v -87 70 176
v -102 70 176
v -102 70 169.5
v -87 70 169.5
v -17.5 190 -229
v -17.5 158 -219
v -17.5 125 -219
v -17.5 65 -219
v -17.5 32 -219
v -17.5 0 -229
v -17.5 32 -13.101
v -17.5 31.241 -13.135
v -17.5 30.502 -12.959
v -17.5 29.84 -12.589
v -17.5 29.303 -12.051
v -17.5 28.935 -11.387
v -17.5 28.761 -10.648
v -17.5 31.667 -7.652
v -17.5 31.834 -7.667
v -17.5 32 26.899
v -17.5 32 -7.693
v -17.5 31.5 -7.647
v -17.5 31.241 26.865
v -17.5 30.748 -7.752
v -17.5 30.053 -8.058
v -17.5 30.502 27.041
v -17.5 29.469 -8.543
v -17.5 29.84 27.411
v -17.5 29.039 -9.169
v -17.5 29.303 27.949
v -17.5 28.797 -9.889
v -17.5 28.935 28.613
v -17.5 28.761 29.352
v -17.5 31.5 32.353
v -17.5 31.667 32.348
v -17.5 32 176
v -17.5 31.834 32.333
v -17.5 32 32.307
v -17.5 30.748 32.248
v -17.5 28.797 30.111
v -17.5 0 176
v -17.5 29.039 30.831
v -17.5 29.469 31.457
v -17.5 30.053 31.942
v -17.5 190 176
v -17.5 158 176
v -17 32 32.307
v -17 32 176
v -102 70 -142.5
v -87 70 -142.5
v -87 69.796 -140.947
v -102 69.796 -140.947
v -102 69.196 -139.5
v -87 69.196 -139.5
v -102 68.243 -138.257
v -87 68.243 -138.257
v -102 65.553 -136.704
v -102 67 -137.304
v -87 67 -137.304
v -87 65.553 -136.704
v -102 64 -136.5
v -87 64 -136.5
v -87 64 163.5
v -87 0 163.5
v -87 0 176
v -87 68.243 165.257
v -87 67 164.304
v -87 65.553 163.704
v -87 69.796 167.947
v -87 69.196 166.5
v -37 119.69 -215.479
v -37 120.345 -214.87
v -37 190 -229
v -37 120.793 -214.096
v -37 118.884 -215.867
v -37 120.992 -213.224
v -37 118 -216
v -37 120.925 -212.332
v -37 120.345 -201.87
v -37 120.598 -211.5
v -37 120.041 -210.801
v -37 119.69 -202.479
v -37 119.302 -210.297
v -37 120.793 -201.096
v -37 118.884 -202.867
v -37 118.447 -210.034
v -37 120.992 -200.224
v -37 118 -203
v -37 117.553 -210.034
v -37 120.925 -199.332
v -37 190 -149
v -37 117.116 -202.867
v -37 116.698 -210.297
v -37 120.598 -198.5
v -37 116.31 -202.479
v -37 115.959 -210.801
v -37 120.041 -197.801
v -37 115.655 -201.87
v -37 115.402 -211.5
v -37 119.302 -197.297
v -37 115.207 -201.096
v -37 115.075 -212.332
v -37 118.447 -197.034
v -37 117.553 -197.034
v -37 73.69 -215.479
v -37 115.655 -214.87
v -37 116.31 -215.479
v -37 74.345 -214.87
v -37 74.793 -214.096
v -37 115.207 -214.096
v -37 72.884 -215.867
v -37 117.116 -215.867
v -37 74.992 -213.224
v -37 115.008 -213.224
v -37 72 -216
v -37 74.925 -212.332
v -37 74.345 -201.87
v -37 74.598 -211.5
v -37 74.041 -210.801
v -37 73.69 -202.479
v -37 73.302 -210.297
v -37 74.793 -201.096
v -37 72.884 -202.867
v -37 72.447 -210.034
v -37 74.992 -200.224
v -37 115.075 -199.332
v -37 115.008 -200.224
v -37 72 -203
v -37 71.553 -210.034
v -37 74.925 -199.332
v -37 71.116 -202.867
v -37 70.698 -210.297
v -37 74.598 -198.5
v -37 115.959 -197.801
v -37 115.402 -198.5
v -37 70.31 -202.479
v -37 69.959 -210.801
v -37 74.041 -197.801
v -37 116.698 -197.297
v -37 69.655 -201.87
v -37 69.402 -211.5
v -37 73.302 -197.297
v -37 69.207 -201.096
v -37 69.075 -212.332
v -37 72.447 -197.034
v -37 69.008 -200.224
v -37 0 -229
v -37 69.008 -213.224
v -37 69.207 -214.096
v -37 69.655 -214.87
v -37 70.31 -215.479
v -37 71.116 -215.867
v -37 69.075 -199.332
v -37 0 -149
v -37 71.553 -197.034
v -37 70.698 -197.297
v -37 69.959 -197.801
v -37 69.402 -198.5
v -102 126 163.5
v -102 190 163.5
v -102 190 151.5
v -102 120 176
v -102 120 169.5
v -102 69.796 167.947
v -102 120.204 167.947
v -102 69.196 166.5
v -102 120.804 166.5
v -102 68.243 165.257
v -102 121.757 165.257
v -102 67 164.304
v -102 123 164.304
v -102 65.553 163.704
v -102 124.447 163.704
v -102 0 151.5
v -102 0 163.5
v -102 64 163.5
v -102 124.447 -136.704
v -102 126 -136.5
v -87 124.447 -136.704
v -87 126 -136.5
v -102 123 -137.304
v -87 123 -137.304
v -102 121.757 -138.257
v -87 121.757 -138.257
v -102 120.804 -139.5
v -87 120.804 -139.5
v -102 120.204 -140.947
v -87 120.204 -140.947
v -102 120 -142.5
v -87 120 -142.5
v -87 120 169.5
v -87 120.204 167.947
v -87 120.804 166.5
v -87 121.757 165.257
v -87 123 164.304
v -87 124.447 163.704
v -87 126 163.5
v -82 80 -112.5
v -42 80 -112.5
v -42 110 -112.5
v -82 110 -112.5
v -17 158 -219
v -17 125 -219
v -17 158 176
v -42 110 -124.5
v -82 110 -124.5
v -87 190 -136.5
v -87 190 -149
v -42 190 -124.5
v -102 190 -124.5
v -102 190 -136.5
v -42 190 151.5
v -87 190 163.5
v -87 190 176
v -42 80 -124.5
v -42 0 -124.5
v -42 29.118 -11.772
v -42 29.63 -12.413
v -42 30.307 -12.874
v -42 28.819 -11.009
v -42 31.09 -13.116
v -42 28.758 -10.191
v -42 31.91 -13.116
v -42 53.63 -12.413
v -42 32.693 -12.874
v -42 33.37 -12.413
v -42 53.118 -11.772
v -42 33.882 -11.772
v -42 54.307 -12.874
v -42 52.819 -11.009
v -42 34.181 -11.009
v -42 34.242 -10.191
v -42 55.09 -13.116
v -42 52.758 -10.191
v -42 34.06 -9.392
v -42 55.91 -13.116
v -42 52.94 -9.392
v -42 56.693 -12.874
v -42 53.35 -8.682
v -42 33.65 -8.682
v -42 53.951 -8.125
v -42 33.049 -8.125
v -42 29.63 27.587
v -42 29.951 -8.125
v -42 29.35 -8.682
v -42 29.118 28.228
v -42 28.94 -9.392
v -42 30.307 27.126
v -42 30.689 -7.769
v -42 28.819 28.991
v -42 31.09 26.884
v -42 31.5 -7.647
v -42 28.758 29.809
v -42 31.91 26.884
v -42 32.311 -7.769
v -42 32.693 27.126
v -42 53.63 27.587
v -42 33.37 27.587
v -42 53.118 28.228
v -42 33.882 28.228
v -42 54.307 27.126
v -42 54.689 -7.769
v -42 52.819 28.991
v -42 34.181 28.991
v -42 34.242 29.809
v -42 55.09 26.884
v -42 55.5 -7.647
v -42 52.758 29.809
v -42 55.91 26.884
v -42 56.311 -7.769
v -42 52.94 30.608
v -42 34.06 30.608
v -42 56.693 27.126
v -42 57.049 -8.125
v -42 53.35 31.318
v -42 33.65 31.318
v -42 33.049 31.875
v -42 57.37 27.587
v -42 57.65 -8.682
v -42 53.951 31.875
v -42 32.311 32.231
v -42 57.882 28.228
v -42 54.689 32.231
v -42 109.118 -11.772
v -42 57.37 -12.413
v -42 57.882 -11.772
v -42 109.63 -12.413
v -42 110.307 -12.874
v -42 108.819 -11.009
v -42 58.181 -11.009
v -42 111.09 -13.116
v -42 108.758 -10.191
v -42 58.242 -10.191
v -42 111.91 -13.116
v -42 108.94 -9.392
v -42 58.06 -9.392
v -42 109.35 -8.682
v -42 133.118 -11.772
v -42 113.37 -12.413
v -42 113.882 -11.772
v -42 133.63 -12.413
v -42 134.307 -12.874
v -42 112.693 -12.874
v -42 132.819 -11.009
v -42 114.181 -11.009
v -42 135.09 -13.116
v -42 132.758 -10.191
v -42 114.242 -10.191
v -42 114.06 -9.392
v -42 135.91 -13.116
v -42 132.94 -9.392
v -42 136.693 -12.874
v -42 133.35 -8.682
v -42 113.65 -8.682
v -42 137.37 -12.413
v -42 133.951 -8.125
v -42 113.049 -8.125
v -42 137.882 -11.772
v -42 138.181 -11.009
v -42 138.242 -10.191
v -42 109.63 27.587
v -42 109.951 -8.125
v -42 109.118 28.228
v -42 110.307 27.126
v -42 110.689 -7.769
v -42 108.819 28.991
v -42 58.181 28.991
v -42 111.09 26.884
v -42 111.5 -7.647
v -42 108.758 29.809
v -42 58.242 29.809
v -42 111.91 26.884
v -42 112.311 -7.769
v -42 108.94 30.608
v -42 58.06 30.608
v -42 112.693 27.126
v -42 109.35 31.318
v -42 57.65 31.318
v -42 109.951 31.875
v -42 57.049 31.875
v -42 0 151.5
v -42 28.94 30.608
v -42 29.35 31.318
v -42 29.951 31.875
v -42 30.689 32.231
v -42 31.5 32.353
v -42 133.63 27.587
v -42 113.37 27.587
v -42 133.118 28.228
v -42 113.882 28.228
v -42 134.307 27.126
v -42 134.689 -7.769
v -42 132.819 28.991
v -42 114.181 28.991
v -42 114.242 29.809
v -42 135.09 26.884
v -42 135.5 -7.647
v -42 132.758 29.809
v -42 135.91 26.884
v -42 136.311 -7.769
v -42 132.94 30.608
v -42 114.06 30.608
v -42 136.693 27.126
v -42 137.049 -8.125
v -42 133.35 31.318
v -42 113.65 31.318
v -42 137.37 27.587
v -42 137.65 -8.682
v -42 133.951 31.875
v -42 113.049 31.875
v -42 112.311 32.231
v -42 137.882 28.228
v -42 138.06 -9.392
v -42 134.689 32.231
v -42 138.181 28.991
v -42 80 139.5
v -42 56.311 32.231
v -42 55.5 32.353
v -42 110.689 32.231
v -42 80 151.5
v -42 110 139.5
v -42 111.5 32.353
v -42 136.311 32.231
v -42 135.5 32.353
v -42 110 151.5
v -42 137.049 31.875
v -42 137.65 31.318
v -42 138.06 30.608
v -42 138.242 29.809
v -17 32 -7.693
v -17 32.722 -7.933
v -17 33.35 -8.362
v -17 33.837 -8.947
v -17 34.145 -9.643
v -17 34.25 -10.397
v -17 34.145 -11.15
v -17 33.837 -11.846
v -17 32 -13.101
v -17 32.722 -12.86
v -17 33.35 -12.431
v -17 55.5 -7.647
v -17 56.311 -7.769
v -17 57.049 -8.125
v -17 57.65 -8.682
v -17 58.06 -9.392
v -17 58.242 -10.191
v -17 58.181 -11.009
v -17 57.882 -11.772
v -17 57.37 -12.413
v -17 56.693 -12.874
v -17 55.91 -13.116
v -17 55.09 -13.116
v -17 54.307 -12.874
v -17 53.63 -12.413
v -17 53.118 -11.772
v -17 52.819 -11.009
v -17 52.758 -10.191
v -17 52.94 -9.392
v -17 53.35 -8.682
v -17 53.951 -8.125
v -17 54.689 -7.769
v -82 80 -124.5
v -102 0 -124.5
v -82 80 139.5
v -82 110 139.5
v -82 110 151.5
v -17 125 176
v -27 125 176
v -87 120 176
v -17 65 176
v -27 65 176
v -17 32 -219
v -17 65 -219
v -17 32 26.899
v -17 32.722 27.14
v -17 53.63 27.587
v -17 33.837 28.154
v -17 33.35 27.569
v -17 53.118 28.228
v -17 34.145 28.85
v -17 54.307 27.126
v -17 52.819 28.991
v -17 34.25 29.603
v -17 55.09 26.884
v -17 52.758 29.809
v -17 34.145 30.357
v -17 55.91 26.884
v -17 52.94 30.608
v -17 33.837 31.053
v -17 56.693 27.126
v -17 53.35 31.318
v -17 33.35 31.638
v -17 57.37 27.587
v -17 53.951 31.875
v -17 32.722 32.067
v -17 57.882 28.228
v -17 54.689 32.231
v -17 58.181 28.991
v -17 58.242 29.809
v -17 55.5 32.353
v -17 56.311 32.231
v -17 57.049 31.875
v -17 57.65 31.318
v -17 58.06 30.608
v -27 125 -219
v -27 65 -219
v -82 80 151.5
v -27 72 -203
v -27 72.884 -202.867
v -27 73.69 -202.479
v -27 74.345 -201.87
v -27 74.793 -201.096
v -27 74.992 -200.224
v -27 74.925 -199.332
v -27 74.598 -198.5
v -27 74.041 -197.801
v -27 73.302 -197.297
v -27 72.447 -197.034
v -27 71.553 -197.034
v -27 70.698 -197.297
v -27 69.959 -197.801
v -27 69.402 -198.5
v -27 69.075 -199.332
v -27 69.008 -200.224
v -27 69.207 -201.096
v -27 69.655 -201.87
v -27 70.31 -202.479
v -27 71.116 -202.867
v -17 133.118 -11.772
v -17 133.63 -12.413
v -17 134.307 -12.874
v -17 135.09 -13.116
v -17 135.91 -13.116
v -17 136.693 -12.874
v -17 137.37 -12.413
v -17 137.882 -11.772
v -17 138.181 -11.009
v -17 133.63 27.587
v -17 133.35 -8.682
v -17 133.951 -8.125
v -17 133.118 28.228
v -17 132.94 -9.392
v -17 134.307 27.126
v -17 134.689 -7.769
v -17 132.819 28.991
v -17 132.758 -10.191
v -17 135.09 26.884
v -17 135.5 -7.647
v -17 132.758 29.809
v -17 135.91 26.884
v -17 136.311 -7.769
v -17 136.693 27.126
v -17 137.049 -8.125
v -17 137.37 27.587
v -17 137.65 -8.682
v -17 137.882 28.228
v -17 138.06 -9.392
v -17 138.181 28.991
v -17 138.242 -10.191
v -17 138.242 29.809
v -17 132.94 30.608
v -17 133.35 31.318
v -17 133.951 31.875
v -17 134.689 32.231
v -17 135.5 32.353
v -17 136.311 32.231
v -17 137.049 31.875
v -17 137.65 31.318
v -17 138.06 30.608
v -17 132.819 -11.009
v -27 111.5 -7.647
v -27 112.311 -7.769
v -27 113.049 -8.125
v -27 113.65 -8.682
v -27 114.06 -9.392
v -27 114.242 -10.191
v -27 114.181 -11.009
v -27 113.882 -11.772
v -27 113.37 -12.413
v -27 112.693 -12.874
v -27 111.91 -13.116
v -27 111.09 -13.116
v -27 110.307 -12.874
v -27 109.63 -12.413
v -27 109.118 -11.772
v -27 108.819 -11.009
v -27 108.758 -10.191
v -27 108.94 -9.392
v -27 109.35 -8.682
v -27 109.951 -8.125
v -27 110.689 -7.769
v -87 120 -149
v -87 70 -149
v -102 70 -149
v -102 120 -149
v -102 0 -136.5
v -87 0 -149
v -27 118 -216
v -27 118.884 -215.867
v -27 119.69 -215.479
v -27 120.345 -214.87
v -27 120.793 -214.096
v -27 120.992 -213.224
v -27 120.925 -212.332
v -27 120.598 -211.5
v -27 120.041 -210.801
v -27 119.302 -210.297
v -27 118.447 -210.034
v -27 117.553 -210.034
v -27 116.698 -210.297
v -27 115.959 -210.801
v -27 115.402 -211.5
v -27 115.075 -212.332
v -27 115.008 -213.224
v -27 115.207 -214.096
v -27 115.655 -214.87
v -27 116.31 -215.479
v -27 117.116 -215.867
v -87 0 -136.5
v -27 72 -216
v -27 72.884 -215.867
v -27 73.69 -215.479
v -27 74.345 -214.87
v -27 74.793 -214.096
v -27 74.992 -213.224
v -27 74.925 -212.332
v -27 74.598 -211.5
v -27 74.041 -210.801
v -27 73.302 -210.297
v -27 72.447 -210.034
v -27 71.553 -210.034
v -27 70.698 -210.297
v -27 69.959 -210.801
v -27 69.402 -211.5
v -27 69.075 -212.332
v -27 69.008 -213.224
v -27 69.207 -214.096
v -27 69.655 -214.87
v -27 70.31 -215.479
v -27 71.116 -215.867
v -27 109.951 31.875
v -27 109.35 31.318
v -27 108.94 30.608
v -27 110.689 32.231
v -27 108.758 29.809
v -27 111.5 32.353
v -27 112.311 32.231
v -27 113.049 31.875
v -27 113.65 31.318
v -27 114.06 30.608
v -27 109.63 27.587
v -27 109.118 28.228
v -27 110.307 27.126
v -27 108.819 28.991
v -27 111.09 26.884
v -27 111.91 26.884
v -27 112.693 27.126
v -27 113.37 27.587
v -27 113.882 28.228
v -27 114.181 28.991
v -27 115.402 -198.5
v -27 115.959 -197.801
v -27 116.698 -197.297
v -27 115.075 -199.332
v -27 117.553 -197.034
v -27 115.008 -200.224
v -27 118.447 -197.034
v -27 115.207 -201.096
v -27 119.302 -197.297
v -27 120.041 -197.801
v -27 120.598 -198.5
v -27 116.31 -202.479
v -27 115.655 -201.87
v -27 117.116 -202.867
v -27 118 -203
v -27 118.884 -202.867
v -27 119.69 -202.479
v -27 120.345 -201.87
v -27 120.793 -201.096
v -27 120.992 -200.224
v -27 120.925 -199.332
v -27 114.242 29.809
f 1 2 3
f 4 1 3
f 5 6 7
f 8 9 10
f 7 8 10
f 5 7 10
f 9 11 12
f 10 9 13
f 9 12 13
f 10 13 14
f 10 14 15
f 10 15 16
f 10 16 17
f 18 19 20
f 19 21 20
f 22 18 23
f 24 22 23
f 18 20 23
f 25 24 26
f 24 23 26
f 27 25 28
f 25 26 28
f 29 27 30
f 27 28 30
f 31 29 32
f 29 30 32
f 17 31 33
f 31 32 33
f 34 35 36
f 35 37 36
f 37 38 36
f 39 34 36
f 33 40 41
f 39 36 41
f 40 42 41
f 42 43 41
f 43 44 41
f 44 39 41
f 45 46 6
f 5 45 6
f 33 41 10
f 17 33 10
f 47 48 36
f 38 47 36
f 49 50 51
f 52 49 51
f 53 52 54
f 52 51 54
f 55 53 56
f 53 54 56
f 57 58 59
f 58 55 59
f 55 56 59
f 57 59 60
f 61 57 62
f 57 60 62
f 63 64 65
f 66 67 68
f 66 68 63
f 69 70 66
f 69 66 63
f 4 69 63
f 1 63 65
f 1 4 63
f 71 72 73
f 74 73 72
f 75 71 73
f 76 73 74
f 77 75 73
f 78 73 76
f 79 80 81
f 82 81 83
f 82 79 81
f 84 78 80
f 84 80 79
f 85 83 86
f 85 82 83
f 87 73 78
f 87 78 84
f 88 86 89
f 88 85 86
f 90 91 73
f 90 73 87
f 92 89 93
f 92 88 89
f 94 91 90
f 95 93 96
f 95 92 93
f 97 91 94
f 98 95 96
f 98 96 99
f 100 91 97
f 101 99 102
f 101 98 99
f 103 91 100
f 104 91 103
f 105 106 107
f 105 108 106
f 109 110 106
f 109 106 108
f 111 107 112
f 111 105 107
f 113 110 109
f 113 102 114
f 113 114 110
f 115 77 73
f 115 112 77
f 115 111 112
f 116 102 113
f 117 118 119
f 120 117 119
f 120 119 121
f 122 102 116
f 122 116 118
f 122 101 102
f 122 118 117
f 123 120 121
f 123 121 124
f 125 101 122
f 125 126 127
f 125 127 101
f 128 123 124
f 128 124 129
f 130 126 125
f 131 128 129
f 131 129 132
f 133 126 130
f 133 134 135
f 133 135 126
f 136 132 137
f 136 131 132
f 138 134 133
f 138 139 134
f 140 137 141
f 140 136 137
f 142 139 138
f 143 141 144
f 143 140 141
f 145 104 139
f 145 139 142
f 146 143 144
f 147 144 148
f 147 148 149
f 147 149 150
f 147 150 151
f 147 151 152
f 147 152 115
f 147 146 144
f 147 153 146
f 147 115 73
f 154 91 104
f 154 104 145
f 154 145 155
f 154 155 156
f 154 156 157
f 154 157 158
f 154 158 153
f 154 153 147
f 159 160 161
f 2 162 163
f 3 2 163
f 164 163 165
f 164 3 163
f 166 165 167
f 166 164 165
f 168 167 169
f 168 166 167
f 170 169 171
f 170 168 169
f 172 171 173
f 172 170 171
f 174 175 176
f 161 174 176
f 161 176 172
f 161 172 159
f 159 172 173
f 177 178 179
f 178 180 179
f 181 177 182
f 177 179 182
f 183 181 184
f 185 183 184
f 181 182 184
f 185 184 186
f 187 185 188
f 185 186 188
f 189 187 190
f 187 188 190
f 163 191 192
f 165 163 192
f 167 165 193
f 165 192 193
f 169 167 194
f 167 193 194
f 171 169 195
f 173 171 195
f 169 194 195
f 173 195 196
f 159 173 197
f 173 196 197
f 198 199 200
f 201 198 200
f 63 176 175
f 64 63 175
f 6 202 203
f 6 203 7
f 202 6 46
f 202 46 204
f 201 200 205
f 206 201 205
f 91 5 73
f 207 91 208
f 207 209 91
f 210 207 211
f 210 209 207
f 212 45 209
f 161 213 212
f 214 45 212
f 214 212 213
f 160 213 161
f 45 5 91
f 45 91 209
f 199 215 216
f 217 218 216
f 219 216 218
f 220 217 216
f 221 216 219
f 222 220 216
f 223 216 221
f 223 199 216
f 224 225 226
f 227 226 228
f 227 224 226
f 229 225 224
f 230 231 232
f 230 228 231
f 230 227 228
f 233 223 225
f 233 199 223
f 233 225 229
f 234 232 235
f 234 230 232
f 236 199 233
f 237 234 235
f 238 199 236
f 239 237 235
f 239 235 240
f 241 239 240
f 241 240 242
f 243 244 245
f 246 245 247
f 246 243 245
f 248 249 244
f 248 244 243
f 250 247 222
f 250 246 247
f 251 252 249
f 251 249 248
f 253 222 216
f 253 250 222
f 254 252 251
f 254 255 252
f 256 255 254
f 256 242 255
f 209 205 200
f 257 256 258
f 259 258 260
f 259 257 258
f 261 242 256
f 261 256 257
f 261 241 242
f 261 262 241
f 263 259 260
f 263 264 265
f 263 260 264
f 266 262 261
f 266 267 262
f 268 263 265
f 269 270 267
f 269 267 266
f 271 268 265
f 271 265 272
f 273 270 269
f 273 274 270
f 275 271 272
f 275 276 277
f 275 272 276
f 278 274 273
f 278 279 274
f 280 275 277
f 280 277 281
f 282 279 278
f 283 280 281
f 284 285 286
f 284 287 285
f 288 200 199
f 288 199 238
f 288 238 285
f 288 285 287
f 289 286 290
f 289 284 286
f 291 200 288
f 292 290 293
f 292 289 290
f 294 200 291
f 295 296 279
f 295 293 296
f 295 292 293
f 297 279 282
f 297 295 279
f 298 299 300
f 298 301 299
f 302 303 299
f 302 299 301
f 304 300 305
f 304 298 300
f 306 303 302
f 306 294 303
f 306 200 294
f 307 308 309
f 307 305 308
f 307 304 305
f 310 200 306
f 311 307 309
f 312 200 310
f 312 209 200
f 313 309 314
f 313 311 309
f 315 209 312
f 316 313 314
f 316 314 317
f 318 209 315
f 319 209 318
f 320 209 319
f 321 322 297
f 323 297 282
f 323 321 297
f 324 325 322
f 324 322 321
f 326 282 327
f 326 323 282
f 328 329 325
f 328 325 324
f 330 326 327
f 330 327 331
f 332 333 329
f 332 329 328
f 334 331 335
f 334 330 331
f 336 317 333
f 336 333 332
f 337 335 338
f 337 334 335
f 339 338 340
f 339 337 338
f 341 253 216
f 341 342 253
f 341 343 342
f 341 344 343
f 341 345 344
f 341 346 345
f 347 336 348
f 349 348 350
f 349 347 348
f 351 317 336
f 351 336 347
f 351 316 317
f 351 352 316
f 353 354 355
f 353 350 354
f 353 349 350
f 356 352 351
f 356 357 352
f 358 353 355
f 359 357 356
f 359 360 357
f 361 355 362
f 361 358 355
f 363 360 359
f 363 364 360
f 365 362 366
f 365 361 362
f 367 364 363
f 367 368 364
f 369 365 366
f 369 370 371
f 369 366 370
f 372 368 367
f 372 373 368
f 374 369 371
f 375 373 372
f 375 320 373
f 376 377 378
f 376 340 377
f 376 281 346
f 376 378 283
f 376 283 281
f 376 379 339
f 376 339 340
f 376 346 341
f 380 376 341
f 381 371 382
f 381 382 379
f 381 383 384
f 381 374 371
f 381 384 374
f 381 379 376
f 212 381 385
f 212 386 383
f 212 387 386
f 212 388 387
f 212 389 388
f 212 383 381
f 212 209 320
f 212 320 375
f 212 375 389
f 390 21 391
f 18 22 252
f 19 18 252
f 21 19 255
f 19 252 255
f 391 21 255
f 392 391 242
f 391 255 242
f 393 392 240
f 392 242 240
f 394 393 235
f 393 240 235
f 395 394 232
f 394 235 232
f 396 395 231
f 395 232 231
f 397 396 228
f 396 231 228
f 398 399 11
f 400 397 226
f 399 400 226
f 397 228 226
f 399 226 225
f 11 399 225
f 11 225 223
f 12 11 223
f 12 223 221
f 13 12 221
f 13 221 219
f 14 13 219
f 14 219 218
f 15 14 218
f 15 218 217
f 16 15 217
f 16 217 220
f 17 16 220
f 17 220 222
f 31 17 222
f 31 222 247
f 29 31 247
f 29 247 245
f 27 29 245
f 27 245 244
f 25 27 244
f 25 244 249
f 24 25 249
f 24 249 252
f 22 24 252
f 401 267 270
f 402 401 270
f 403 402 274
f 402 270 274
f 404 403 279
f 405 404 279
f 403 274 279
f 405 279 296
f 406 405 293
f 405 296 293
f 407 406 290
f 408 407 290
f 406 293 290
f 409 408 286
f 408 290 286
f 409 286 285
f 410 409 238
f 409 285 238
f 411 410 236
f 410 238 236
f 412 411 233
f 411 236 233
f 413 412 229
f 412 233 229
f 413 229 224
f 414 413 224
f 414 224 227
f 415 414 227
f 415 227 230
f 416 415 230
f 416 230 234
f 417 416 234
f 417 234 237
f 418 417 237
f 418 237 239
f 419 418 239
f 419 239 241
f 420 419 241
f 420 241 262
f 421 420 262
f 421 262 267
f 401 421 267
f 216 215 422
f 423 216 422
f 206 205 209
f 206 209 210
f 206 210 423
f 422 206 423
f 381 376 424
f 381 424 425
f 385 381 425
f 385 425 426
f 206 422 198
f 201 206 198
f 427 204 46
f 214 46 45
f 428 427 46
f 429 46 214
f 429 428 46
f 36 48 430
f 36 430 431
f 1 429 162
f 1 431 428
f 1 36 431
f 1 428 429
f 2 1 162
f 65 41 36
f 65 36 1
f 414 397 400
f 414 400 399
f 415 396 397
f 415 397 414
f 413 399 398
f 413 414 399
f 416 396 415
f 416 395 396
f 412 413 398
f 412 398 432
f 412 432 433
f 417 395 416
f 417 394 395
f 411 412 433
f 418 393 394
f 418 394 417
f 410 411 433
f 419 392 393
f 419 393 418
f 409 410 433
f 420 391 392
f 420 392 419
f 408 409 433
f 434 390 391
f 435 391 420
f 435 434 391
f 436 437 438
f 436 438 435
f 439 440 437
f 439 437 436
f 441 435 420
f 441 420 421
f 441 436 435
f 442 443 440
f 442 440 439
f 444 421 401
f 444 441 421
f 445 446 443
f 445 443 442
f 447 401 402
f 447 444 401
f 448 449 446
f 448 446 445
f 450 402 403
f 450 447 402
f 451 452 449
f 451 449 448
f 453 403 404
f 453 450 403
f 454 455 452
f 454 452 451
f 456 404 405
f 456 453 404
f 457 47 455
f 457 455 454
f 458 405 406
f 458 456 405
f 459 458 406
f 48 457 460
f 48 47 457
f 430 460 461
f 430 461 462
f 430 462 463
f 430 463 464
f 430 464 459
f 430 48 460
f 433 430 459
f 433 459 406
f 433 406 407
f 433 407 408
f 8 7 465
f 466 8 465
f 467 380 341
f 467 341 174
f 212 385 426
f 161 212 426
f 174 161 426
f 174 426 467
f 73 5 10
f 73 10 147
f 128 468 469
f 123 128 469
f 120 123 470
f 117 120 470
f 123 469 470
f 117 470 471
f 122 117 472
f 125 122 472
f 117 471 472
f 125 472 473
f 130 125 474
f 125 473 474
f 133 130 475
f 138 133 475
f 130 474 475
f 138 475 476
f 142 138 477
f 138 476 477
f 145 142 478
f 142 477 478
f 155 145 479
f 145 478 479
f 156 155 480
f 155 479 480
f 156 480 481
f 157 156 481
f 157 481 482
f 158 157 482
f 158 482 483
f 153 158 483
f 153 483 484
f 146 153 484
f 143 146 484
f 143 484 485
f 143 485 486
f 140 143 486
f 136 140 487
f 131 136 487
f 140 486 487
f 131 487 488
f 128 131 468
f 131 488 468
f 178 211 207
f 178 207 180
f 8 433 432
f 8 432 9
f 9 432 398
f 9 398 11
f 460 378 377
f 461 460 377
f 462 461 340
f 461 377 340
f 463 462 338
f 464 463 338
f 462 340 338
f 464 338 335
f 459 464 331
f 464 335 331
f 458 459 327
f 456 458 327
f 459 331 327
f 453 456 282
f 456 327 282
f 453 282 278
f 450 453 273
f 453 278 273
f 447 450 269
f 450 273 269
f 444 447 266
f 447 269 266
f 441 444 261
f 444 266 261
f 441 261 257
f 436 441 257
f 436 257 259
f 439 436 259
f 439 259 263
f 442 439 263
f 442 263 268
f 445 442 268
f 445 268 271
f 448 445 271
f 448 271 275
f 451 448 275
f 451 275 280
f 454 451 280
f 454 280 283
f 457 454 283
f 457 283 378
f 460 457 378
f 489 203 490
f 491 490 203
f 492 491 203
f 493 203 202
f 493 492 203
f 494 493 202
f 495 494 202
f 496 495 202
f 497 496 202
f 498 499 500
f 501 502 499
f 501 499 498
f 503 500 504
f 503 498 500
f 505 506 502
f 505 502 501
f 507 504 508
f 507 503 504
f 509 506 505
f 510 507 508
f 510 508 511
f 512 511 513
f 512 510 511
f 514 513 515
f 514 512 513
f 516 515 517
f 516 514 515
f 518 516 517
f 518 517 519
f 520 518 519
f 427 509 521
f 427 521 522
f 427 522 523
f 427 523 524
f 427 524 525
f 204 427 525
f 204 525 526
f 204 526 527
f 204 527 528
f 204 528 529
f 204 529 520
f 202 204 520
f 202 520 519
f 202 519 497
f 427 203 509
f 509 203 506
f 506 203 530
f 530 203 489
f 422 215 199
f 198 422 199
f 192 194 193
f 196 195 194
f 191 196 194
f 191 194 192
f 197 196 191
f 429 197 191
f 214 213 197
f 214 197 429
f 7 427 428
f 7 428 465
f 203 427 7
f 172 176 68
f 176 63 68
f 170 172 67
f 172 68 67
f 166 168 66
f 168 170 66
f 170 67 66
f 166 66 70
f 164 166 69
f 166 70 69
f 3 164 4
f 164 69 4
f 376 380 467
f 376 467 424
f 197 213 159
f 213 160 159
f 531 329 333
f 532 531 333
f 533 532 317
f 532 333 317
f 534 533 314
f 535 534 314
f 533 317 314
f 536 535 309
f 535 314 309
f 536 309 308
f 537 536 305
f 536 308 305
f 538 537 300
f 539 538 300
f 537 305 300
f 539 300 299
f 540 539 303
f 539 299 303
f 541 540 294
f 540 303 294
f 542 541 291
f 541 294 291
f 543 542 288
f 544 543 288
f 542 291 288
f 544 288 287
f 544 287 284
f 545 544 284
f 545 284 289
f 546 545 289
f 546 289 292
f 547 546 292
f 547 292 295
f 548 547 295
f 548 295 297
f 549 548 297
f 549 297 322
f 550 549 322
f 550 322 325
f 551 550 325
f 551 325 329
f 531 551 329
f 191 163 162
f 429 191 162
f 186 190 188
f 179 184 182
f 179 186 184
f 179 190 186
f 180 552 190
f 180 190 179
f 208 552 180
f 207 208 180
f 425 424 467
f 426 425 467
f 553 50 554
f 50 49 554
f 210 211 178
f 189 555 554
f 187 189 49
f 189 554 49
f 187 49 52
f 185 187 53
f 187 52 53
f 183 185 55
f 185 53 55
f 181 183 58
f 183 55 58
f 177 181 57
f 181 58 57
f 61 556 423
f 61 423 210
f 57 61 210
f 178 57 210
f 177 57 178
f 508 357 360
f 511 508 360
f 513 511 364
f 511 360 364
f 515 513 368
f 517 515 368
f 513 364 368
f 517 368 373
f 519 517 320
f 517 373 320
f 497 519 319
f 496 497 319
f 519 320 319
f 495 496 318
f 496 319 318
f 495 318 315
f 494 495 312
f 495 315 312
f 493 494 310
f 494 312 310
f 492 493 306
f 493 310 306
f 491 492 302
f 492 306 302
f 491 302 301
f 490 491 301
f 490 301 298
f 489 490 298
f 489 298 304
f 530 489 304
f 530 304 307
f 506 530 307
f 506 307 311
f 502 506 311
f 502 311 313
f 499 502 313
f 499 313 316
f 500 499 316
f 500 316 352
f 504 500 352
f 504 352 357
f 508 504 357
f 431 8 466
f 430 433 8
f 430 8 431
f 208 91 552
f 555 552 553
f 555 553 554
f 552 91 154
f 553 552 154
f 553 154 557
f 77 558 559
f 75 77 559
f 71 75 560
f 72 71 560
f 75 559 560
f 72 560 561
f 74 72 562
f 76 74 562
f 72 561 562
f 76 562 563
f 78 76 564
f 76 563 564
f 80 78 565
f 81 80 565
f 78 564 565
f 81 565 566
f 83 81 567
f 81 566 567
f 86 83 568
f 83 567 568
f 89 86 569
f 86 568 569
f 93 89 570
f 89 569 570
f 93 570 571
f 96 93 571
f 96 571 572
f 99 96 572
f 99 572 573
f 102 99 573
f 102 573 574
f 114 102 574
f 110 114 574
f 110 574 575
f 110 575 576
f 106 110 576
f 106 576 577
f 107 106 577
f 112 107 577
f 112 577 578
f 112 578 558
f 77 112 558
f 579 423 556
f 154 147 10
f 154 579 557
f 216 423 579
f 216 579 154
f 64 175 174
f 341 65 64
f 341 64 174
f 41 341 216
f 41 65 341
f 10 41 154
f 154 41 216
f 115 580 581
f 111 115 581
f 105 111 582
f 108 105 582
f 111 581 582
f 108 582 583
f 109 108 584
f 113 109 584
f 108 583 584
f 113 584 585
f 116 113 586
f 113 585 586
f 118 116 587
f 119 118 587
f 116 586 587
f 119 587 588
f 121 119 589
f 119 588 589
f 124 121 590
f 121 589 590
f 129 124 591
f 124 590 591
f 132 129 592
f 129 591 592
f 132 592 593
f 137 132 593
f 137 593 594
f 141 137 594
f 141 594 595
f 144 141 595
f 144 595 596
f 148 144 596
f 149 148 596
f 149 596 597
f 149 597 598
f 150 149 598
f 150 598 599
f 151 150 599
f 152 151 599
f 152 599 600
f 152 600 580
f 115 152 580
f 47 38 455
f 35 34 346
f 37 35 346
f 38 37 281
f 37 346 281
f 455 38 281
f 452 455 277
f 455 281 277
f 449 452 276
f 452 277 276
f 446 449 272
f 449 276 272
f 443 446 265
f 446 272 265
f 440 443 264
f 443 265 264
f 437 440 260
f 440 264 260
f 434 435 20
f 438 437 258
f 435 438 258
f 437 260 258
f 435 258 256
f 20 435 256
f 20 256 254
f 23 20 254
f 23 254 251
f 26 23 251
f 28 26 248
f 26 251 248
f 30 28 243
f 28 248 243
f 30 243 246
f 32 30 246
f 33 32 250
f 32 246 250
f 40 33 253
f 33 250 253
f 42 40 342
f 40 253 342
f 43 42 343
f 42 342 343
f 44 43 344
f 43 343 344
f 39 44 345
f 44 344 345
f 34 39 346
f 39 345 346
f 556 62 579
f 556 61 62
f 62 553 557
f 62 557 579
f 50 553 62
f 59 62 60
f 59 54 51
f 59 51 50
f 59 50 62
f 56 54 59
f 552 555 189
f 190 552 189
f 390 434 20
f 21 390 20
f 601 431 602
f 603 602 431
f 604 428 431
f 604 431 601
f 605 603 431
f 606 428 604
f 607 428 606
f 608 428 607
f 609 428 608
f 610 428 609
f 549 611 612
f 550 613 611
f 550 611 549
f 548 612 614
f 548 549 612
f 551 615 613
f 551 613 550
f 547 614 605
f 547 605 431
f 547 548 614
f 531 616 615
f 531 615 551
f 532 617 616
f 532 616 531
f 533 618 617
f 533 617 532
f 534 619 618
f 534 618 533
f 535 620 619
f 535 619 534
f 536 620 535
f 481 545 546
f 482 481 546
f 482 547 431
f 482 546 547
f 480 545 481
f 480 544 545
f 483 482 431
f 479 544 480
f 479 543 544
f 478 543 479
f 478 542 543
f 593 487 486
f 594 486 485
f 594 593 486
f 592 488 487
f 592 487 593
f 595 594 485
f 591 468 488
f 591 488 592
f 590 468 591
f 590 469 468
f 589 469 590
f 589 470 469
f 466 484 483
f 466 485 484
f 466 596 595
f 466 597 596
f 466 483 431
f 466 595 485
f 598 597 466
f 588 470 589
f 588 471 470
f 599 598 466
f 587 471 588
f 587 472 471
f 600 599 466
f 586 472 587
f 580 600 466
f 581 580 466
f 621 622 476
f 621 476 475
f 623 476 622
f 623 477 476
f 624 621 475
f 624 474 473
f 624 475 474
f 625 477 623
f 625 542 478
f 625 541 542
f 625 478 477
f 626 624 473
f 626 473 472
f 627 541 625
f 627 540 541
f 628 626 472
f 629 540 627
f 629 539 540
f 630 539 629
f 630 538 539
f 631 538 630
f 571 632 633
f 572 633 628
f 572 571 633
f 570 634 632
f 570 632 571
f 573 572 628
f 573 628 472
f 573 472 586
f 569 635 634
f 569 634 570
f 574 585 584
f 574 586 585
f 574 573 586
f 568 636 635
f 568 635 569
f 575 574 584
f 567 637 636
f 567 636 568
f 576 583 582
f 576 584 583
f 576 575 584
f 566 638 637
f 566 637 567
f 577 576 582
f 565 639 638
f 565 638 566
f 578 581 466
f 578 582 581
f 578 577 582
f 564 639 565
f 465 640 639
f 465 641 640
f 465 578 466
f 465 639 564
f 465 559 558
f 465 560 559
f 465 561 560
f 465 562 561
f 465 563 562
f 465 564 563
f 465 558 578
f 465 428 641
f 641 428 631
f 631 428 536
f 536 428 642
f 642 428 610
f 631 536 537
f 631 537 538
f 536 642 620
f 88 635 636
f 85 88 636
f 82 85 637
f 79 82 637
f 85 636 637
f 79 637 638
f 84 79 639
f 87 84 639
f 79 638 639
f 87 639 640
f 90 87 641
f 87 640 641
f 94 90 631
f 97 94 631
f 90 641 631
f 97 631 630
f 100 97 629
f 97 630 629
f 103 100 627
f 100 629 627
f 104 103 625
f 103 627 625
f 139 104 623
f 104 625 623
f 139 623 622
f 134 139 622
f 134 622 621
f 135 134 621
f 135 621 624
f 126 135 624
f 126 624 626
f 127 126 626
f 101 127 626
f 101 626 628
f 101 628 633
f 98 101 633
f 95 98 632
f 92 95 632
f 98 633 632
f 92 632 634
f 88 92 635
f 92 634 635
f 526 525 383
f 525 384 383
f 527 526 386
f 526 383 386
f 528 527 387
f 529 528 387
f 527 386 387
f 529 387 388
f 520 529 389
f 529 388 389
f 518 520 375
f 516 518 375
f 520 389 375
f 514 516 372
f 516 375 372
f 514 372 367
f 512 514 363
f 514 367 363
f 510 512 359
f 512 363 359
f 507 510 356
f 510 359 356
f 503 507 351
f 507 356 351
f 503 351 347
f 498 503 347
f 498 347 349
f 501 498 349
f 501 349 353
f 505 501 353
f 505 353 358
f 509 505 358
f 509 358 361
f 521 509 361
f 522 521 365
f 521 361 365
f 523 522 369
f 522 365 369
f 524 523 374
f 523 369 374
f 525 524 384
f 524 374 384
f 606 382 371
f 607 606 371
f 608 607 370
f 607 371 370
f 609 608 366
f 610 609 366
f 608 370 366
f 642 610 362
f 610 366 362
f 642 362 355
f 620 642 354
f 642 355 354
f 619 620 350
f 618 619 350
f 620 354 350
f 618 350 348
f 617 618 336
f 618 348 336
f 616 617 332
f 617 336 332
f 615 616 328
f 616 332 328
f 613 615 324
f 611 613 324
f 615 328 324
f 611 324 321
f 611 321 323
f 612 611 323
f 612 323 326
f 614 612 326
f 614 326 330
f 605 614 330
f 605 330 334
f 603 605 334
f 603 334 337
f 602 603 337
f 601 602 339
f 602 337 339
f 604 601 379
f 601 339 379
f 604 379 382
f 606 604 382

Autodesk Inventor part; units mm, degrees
ref_plane "YZ Plane" through (0, 0, 0) normal (1, 0, 0) x (0, 1, 0)
ref_plane "XZ Plane" through (0, 0, 0) normal (0, 1, 0) x (-1, 0, 0)
ref_plane "XY Plane" through (0, 0, 0) normal (0, 0, 1) x (1, 0, 0)
sketch "Эскиз1" plane through (0, 0, 0) normal (0, 1, 0) x (-1, 0, 0)
  line L0 (102, 151) -> (42, 151)
  line L1 (42, -149) -> (102, -149)
  line L2 (102, -149) -> (102, 151)
  line L3 (102, 151) -> (42, 151)
  line L4 (42, 151) -> (42, 176)
  line L5 (42, 176) -> (102, 176)
  line L6 (102, 176) -> (102, 151)
  line L7 (102, -149) -> (42, -149)
  line L8 (42, -149) -> (42, -124)
  line L9 (42, -124) -> (102, -124)
  line L10 (102, -124) -> (102, -149)
  line L11 (42, 176) -> (42, -124)
  line L12 (42, 176) -> (17, 176)
  line L13 (17, 176) -> (17, -149)
  line L14 (17, -149) -> (42, -149)
  line L15 (42, -149) -> (42, 176)
  point P0 (0, 0)
  point P1 (42, 151)
  dimension "d0" = 300
  dimension "d1" = 60
  dimension "d2" = 25
  dimension "d3" = 25
  dimension "d5" = 25
  dimension "d33" = 25
extrude "Выдавливание1" add sketch "Эскиз1" along normal blind 190 contours L0 L4 L5 L6 | L11 L8 L14 L13 L12 L4 | L2 L1 L8 L9
sketch "Эскиз2" plane through (-17, 0, 176) normal (1, 0, 0) x (0, 0, -1)
  line L0 (0, 0) -> (325, 0) projected
  line L1 (325, 0) -> (325, 190) projected
  line L2 (0, 190) -> (325, 190) projected
  line L3 (0, 0) -> (0, 190) projected
  line L4 (-98, 158) -> (488, 158)
  line L5 (488, 158) -> (488, 32)
  line L6 (488, 32) -> (-98, 32)
  line L7 (-98, 32) -> (-98, 158)
  point P0 (176, 0)
  point P1 (325, 32)
  point P2 (0, 32)
  point P3 (0, 158)
  point P4 (325, 158)
  dimension "d8" = 32
  dimension "d9" = 32
extrude "Выдавливание2" cut sketch "Эскиз2" against normal blind 0.5 contours L3 L6 L1 L0 | L3 L2 L1 L4
sketch "Эскиз4" plane through (-102, 0, -149) normal (0, 0, -1) x (-1, 0, 0)
  line L0 (-85, 32) -> (-84.5, 32) projected
  line L1 (-84.5, 32) -> (-84.5, 0) projected
  line L2 (-84.5, 0) -> (0, 0) projected
  line L3 (0, 0) -> (0, 190) projected
  line L4 (-84.5, 190) -> (0, 190) projected
  line L5 (-84.5, 190) -> (-84.5, 158) projected
  line L6 (-84.5, 158) -> (-85, 158) projected
  line L7 (-85, 32) -> (-85, 158) projected
  line L8 (-92, 195) -> (-65, 195)
  line L9 (-65, 195) -> (-65, -10)
  line L10 (-65, -10) -> (-92, -10)
  line L11 (-92, -10) -> (-92, 195)
  point P0 (-102, 0)
  point P1 (-65, 0)
  point P2 (-65, 190)
  dimension "d12" = 20
extrude "Выдавливание3" add sketch "Эскиз4" along normal blind 70 contours L7 L6 L5 L4 L9 L2 L1 L0
sketch "Эскиз5" plane through (-17, 32, 176) normal (1, 0, 0) x (0, 0, -1)
  line L0 (0, 0) -> (395, 0) projected
  line L1 (395, 126) -> (395, 0) projected
  line L2 (0, 126) -> (395, 126) projected
  line L3 (0, 0) -> (0, 126) projected
  line L4 (-43, 93) -> (474, 93)
  line L5 (474, 93) -> (474, 33)
  line L6 (474, 33) -> (-43, 33)
  line L7 (-43, 33) -> (-43, 93)
  point P0 (176, -32)
  dimension "d15" = 33
  dimension "d16" = 33
extrude "Выдавливание4" cut sketch "Эскиз5" against normal blind 10 contours L6 L7 L4 L3 | L3 L4 L1 L6 | L1 L4 L5 L6
sketch "Эскиз6" plane through (-102, 0, -149) normal (-1, 0, 0) x (0, 0, 1)
  line L0 (0, 0) -> (25, 0) projected
  line L1 (25, 0) -> (25, 190) projected
  line L2 (0, 190) -> (25, 190) projected
  line L3 (0, 0) -> (0, 190) projected
  line L4 (300, 0) -> (325, 0) projected
  line L5 (325, 0) -> (325, 190) projected
  line L6 (300, 190) -> (325, 190) projected
  line L7 (300, 0) -> (300, 190) projected
  line L8 (325, 190) -> (-70, 190) projected
  line L9 (300, 0) -> (325, 0) projected
  line L10 (325, 190) -> (312.5, 190)
  line L11 (312.5, 190) -> (312.5, 0)
  line L12 (312.5, 0) -> (325, 0)
  line L13 (325, 0) -> (325, 190)
  line L14 (0, 190) -> (25, 190) projected
  line L15 (0, 0) -> (25, 0) projected
  line L16 (0, 190) -> (12.5, 190)
  line L17 (12.5, 190) -> (12.5, 0)
  line L18 (12.5, 0) -> (0, 0)
  line L19 (0, 0) -> (0, 190)
  line L20 (347, 70) -> (-28, 70)
  line L21 (-28, 70) -> (-28, 120)
  line L22 (-28, 120) -> (347, 120)
  line L23 (347, 120) -> (347, 70)
  point P0 (149, 0)
  point P1 (12.5, 0)
  point P2 (12.5, 190)
  point P3 (12.5, 70)
  point P4 (0, 70)
  point P5 (0, 120)
  point P6 (12.5, 120)
  point P7 (325, 70)
  point P8 (312.5, 70)
  point P9 (312.5, 120)
  point P10 (325, 120)
  dimension "d21" = 70
  dimension "d22" = 70
extrude "Выдавливание5" cut sketch "Эскиз6" against normal blind 15 contours L3 L20 L17 L0 | L3 L2 L17 L22 | L20 L5 L4 L11 | L11 L6 L5 L22
fillet "Сопряжение1" radius 6 4 edges at (-94.5, 70, -136.5) (-94.5, 120, -136.5) (-94.5, 120, 163.5) (-94.5, 70, 163.5)
sketch "Эскиз8" plane through (-17, 158, 176) normal (1, 0, 0) x (0, 0, -1)
  line L0 (376, -40) -> (389, -40)
  line L1 (389, -40) -> (389, -86)
  line L2 (389, -86) -> (376, -86)
  line L3 (376, -86) -> (376, -40)
  line L4 (395, -33) -> (395, -93) projected
  circle A0 centre (389, -40) radius 3
  circle A1 centre (389, -86) radius 3
  circle A2 centre (376, -40) radius 3
  circle A3 centre (376, -86) radius 3
  point P0 (176, -158)
  dimension "d24" = 6
  dimension "d25" = 46
  dimension "d26" = 13
extrude "Выдавливание6" cut sketch "Эскиз8" against normal blind 100 contours L3 A2 L0 | L0 A2 L3 | A0 L1 L0 | L0 L1 A0 | A3 L2 L3 | L3 L2 A3 | A1 L2 L1 | L1 L2 A1
sketch "Эскиз9" plane through (-102, 0, -219) normal (0, 0, -1) x (-1, 0, 0)
  line L0 (-84.5, 190) -> (-84.5, 158) projected
  line L1 (-65, 0) -> (-15, 0) projected
  line L2 (-84.5, 190) -> (-65, 190)
  line L3 (-65, 190) -> (-65, 0)
  line L4 (-65, 0) -> (-84.5, 0)
  line L5 (-84.5, 0) -> (-84.5, 190)
  point P0 (-102, 0)
  point P1 (-84.5, 158)
extrude "Выдавливание7" add sketch "Эскиз9" along normal blind 10
sketch "Эскиз10" plane through (-42, 0, -124) normal (-1, 0, 0) x (0, 0, 1)
  line L0 (159.1033, 24) -> (108.1033, 24)
  line L1 (159.1033, 63) -> (159.1033, 24)
  line L2 (108.1033, 63) -> (159.1033, 63)
  line L3 (108.1033, 24) -> (108.1033, 63)
  circle A0 centre (153.6033, 31.5) radius 2.75
  circle A1 centre (113.6033, 31.5) radius 2.75
  circle A2 centre (113.6033, 55.5) radius 2.75
  circle A3 centre (153.6033, 55.5) radius 2.75
  line L4 (158.6033, 104) -> (159.6033, 104)
  line L5 (159.1033, 104) -> (159.1033, 63)
  line L6 (159.1033, 104) -> (108.1033, 104)
  line L7 (159.1033, 143) -> (159.1033, 104)
  line L8 (108.1033, 143) -> (159.1033, 143)
  line L9 (108.1033, 104) -> (108.1033, 143)
  circle A4 centre (153.6033, 111.5) radius 2.75
  circle A5 centre (113.6033, 111.5) radius 2.75
  circle A6 centre (113.6033, 135.5) radius 2.75
  circle A7 centre (153.6033, 135.5) radius 2.75
  line L10 (275, 0) -> (275, 190) projected
  line L11 (275, 26) -> (165, 26)
  line L12 (165, 26) -> (165, 46)
  line L13 (165, 46) -> (275, 46)
  line L14 (275, 46) -> (275, 26)
  line L15 (165, 26) -> (163, 26)
  line L16 (164.1033, 26) -> (164.1033, 24)
  point P0 (124, 0)
  point P1 (133.6033, 23.5)
  point P2 (133.6033, 103.5)
extrude "Выдавливание8" cut sketch "Эскиз10" against normal blind 33 contours A0 | A1 | A2 | A3 | A4 | A5 | A6 | A7
sketch "Sketch11" plane through (0, 190, 0) normal (0, 1, 0) x (1, 0, 0)
  line L0 (-42, -151) -> (-102, -151) projected
  line L1 (-102, -151) -> (-42, -151)
  line L2 (-42, -151) -> (-42, -151.5)
  line L3 (-42, -151.5) -> (-102, -151.5)
  line L4 (-102, -151.5) -> (-102, -151)
  line L5 (-102, 124) -> (-42, 124)
  line L6 (-42, 124) -> (-42, 124.5)
  line L7 (-42, 124.5) -> (-102, 124.5)
  line L8 (-102, 124.5) -> (-102, 124)
  line L9 (-17.5, -176) -> (-17.5, 229) projected
  point P0 (0, 0)
  dimension "d34" = 24.5
  dimension "d35" = 24.5
  dimension "d36" = 0.5
  dimension "d37" = 0.5
extrude "Extrusion9" cut sketch "Sketch11" against normal blind 200
sketch "Sketch12" plane through (-42, 0, 151.5) normal (-1, 0, 0) x (0, 0, 1)
  line L0 (-276, 190) -> (-276, 0) projected
  line L1 (-276, 80) -> (-264, 80)
  line L2 (-264, 80) -> (-264, 110)
  line L3 (-264, 110) -> (-276, 110)
  line L4 (-276, 110) -> (-276, 80)
  line L5 (0, 190) -> (0, 0) projected
  line L6 (0, 80) -> (-12, 80)
  line L7 (-12, 80) -> (-12, 110)
  line L8 (-12, 110) -> (0, 110)
  line L9 (0, 110) -> (0, 80)
  line L10 (-276, 190) -> (0, 190) projected
  line L11 (0, 0) -> (-276, 0) projected
  point P0 (-151.5, 0)
  point P1 (0, 110)
  dimension "d40" = 80
  dimension "d41" = 80
  dimension "d42" = 80
  dimension "d43" = 80
  dimension "d46" = 12
  dimension "d47" = 12
extrude "Extrusion10" add sketch "Sketch12" along normal blind 40 contours L3 L2 L1 L0 | L5 L6 L7 L8
properties part number "KaretkaY"
